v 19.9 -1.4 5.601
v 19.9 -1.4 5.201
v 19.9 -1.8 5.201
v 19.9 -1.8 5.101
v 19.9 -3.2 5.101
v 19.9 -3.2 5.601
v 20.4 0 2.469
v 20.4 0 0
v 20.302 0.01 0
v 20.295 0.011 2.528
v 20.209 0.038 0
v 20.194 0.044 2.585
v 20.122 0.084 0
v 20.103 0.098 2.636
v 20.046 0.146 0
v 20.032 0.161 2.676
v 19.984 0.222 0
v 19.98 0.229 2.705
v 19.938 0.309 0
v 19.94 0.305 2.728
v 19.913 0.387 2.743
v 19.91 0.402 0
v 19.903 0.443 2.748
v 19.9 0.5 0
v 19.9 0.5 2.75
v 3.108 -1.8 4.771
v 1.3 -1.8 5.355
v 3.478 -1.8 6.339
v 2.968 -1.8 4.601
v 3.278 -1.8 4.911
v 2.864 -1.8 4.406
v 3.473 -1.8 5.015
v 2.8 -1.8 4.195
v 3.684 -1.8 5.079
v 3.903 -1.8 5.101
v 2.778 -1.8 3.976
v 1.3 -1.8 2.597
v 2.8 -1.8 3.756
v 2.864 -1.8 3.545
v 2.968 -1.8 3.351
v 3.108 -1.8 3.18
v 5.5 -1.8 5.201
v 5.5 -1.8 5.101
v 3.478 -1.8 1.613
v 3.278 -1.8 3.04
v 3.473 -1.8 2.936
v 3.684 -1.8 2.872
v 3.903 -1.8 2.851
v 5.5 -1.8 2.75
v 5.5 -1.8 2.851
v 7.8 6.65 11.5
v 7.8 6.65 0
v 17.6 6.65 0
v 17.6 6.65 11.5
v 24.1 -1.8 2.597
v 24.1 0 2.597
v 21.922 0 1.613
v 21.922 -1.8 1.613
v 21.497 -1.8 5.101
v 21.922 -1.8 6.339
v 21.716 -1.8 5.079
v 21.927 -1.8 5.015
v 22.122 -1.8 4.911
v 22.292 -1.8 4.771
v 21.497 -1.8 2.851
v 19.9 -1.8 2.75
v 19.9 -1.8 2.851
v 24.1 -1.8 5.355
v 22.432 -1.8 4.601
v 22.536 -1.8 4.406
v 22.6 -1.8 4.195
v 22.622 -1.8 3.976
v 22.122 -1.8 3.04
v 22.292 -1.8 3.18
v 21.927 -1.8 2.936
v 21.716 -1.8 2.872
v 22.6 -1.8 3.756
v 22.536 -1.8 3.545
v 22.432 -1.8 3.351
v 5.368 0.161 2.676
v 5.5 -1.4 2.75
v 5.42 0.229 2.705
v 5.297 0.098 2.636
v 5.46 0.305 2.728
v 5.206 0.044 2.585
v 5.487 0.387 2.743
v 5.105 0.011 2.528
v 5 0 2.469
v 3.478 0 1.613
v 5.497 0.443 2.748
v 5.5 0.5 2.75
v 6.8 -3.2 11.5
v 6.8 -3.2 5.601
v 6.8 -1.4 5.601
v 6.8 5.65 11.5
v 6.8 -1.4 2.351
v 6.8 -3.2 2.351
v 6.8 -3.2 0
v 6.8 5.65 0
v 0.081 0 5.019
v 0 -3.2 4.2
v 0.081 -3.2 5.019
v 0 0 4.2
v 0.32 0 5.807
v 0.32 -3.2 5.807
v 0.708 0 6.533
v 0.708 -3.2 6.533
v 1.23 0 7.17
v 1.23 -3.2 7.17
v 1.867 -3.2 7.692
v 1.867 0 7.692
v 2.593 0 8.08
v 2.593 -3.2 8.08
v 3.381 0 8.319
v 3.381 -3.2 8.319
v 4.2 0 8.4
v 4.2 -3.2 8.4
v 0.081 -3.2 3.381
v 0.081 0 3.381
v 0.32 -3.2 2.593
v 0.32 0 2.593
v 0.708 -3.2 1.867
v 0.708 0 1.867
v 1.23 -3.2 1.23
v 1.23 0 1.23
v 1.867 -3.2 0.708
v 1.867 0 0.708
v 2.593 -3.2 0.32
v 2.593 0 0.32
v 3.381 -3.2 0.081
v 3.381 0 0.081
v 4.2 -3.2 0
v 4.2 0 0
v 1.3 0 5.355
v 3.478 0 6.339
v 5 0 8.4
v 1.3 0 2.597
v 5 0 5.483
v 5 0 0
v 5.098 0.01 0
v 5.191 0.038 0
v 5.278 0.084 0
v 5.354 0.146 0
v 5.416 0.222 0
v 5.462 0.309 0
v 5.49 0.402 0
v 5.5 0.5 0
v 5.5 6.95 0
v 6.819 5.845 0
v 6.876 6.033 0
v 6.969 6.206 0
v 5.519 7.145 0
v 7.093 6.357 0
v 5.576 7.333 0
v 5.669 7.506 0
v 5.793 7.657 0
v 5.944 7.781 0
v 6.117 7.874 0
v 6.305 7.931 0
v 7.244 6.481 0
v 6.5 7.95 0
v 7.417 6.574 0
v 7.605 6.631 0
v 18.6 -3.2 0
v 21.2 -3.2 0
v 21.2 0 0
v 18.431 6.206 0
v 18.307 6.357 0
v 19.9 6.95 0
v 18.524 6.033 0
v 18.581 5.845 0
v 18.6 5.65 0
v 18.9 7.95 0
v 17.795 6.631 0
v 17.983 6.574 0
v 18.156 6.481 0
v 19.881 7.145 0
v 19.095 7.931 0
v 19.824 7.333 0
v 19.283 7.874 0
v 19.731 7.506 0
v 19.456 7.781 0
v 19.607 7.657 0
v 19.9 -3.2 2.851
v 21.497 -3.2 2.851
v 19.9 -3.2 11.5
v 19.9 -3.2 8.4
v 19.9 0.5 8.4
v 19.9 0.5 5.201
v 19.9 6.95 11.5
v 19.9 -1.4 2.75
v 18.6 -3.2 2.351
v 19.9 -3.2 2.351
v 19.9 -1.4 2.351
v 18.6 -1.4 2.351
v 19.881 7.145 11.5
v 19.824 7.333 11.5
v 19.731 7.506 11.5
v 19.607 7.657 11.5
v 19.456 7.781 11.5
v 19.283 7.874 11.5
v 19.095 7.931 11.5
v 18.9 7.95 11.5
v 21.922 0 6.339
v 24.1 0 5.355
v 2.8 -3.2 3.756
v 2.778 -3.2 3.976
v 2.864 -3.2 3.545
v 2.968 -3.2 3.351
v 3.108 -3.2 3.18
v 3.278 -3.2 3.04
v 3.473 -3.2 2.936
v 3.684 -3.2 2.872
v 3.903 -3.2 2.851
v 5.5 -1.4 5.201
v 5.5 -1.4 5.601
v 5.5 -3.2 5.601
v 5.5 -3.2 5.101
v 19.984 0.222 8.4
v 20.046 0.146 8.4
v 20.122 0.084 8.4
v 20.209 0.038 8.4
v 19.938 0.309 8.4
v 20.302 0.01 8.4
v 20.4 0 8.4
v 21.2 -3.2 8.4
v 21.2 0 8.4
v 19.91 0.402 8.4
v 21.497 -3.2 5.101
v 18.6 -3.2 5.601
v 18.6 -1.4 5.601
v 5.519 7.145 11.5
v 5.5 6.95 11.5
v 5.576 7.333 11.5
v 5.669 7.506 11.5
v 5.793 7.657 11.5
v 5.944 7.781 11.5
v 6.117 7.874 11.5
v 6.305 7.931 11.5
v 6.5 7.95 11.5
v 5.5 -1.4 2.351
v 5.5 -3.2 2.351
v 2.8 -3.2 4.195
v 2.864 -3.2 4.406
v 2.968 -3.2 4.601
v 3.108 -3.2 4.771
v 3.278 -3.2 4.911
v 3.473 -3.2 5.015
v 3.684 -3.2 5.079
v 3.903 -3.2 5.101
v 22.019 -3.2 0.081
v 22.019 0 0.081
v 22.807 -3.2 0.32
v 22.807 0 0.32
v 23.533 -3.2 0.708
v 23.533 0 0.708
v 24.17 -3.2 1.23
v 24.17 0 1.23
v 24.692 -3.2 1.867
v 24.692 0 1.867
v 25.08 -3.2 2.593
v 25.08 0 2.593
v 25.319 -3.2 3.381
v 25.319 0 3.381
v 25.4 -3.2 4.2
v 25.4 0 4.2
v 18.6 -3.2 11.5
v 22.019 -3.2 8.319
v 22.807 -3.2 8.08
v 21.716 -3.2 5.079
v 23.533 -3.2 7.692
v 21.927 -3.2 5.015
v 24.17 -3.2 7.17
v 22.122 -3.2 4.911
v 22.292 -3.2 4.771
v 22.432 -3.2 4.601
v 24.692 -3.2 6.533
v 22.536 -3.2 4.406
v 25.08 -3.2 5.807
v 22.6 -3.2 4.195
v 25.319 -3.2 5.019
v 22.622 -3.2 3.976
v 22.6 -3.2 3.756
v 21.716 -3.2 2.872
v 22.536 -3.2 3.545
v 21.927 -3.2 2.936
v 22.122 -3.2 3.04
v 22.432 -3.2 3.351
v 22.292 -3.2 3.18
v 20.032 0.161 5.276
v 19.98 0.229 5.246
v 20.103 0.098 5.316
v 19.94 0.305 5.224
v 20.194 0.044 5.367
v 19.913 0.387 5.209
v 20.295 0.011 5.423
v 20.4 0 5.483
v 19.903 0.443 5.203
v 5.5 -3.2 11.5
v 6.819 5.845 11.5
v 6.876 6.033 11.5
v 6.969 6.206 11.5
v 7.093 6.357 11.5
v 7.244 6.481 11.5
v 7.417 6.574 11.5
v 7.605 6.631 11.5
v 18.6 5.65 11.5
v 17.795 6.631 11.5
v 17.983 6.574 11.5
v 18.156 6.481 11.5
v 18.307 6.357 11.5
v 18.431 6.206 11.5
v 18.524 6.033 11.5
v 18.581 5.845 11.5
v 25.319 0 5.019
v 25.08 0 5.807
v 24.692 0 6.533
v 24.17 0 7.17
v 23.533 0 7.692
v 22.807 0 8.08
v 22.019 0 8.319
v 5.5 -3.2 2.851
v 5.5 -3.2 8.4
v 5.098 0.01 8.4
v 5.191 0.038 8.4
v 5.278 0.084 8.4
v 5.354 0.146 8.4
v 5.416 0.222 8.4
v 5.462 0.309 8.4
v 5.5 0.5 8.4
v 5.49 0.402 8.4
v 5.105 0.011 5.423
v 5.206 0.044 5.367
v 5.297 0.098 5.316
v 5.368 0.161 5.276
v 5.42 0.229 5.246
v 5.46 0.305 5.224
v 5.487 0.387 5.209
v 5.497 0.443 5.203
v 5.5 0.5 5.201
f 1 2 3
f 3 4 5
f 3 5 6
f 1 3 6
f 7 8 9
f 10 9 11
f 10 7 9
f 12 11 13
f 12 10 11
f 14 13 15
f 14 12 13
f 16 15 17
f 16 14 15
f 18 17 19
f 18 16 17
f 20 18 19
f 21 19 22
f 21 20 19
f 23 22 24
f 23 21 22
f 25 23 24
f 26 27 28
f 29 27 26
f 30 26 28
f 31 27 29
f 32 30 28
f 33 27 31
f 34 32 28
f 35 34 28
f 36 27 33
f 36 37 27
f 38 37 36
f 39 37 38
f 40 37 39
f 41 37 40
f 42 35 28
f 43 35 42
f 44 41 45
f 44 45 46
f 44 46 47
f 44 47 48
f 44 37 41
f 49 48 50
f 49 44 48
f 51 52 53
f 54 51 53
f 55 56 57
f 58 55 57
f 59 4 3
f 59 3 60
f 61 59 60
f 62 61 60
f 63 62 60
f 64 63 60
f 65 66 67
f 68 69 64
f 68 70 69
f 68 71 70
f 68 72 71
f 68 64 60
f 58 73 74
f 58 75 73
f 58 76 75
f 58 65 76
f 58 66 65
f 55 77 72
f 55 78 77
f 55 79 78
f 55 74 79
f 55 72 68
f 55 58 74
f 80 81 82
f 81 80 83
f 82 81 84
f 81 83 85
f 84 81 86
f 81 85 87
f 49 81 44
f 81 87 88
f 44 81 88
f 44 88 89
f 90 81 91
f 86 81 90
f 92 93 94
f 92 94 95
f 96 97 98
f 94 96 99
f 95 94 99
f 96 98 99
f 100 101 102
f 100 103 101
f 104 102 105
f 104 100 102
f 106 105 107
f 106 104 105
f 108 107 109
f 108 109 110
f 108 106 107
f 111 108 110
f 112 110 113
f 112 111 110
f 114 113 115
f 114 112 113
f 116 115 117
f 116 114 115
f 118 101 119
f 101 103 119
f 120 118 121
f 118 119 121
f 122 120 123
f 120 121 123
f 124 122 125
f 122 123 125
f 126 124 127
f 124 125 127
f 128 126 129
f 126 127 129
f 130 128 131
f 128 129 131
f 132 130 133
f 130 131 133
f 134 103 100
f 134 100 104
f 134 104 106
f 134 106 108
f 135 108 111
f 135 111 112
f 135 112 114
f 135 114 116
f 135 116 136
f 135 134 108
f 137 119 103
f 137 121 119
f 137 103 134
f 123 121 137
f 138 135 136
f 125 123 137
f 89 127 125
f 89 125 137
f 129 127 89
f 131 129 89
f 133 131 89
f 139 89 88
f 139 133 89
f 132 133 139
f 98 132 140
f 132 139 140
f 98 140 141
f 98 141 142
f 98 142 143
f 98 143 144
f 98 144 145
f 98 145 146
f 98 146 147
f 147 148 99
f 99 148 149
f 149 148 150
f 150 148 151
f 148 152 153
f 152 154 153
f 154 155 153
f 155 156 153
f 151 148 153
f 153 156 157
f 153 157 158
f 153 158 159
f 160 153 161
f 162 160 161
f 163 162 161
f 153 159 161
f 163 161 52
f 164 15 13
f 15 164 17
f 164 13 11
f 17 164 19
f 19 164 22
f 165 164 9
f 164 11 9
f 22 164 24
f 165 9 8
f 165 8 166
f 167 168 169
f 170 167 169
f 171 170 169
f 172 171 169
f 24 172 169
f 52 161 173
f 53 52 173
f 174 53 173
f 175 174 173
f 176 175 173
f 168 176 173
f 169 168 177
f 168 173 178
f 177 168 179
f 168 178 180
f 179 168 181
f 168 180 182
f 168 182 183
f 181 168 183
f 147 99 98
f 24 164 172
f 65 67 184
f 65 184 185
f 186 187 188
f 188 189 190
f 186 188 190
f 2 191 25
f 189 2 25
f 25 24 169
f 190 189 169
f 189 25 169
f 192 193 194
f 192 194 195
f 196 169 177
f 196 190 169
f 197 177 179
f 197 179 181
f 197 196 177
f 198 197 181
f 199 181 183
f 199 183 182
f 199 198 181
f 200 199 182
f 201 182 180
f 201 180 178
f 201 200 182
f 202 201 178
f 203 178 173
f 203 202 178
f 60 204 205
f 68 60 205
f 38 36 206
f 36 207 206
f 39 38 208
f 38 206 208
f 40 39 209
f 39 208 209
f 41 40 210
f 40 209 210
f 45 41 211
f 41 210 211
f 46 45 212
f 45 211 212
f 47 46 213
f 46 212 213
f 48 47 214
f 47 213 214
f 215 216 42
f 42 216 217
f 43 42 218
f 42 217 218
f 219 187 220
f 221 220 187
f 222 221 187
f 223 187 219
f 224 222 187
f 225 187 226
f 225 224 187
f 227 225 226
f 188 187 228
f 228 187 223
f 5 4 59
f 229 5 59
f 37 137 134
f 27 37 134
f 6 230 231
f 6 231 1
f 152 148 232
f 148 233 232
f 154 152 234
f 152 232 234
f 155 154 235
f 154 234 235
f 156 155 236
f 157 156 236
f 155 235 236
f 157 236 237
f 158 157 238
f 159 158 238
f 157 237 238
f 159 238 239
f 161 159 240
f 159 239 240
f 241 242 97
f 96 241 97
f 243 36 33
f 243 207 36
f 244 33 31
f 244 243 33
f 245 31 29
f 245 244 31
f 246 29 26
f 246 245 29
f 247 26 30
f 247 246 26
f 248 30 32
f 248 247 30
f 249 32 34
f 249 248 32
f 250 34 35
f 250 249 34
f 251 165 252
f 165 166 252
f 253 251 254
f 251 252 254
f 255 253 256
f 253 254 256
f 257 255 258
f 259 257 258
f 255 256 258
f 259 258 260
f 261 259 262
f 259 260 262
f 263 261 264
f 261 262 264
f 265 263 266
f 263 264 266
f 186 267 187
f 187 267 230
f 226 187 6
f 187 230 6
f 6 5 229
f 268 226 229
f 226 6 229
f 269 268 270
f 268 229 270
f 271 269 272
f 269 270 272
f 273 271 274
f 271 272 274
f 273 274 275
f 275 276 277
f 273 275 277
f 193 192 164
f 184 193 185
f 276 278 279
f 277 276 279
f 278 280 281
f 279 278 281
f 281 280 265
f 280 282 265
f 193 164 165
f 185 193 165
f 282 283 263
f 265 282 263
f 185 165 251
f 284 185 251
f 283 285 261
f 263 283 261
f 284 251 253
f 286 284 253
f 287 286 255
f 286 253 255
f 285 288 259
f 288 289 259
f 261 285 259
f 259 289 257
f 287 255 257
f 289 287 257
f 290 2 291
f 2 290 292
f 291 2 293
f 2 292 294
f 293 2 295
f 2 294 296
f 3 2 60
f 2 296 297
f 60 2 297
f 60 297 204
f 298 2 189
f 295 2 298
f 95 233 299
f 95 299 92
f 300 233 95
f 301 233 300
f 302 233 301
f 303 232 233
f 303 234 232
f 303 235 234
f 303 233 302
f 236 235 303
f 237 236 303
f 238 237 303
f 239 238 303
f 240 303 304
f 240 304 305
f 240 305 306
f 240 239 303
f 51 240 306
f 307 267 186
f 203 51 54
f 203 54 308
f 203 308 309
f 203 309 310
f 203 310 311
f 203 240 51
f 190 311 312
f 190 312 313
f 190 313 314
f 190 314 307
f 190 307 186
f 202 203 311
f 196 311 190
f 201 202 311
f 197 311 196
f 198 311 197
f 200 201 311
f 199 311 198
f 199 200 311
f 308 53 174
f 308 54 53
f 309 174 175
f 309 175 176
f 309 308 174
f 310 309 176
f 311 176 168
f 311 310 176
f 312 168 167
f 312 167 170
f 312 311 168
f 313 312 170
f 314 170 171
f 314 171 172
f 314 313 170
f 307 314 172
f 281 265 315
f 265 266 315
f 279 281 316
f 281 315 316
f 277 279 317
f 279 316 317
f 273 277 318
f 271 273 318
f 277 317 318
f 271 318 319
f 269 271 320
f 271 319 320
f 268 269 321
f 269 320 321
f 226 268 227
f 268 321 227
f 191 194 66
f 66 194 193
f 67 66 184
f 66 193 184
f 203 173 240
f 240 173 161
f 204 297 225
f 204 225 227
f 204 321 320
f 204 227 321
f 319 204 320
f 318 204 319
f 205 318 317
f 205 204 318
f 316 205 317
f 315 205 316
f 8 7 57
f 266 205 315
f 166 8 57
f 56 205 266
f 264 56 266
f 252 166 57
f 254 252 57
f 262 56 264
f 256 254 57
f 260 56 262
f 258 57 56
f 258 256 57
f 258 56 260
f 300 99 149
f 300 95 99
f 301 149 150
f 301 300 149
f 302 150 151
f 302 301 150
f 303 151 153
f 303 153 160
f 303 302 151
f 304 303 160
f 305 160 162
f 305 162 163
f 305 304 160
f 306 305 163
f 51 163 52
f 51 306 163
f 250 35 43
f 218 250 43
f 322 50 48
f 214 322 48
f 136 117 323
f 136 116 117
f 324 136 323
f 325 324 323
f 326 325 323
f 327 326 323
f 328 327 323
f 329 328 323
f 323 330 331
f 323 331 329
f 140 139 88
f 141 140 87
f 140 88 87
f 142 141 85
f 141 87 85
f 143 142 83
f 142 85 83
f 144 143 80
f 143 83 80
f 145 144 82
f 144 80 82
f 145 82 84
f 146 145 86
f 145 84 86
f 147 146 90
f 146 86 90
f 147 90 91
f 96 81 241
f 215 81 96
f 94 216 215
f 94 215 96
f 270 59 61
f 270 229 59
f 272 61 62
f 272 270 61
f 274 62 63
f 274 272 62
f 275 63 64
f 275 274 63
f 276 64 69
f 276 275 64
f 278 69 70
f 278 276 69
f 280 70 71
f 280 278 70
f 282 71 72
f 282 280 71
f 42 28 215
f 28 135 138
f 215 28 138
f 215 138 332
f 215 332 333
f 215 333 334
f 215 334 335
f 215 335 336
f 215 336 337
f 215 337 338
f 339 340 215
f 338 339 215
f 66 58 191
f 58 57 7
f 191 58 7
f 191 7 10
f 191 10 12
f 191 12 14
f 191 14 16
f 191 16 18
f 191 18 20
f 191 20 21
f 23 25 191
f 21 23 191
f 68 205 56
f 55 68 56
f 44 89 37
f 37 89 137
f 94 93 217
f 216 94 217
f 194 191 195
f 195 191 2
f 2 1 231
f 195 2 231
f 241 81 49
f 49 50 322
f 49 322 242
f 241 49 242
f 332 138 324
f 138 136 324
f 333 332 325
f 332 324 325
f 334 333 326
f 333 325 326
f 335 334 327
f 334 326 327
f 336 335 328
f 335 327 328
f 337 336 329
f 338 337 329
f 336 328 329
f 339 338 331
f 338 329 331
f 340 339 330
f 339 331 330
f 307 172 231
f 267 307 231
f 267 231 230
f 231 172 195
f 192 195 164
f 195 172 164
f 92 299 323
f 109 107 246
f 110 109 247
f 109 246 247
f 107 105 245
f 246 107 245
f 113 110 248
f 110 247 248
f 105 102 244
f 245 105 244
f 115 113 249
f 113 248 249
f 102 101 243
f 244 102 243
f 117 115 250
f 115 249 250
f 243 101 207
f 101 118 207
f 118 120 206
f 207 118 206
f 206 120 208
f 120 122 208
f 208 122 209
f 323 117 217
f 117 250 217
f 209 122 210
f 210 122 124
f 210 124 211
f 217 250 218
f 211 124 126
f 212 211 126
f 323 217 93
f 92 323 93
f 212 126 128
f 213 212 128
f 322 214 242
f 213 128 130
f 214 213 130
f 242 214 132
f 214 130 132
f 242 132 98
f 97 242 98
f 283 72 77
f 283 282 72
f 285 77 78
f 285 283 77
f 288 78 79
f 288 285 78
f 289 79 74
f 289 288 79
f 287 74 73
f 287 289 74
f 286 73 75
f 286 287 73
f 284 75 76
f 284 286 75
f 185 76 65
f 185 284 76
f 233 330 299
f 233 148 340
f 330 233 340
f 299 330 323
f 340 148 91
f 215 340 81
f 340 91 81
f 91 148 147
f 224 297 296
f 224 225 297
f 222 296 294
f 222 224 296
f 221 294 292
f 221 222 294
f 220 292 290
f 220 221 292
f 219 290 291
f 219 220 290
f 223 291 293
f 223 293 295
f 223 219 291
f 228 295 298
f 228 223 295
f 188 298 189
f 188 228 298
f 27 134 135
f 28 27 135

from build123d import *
from OCP.BRepFilletAPI import BRepFilletAPI_MakeFillet

# Parameters (mm, degrees)
BOSS_EXTRUDE1_DEPTH = 11.5
SKETCH1_3_W         = 5.5
SKETCH1_3_H         = 3.2
BOSS_EXTRUDE2_DEPTH = 8.4
CUT_EXTRUDE1_DEPTH  = 1.8
SKETCH5_3_W         = 2.721866022
SKETCH5_3_H         = 2.25
CUT_EXTRUDE2_DEPTH  = 29.993318196
FILLET1_R           = 4.2
FILLET1_R_2         = 1.125
FILLET1_R_3         = 1
FILLET1_R_4         = 0.5
CUT_EXTRUDE12_DEPTH = 1.8


with BuildPart() as part:
    # Sketch1 → Boss-Extrude1 (new body)
    with BuildSketch(Plane.XY):
        Polygon((5.5, 7.95), (5.5, 0), (5.5, -3.2), (6.8, -3.2), (6.8, 6.65), (12.7, 6.65), (12.7, 7.95), align=None)
        Polygon((19.9, 7.95), (12.7, 7.95), (12.7, 6.65), (18.6, 6.65), (18.6, -3.2), (19.9, -3.2), (19.9, 0), align=None)
    extrude(amount=BOSS_EXTRUDE1_DEPTH)

    # Sketch1<3> → Boss-Extrude2 (add)
    with BuildSketch(Plane.XY):
        with Locations((2.75, -1.6)):
            Rectangle(SKETCH1_3_W, SKETCH1_3_H)
        with Locations((22.65, -1.6)):
            Rectangle(SKETCH1_3_W, SKETCH1_3_H)
    extrude(amount=BOSS_EXTRUDE2_DEPTH)

    # Sketch5 → Cut-Extrude1 (cut)
    with BuildSketch(Plane(origin=(0, 0, 0), x_dir=(1, 0, 0), z_dir=(0, 1, 0))):
        Polygon((3.478202851, -1.61261316), (1.3, -2.596789569), (1.3, -5.354715804), (3.478202851, -6.338892213), (5.5, -5.201401594), (5.5, -5.100752687), (2.778133978, -5.100752687), (2.778133978, -2.850752687), (5.5, -2.850752687), (5.5, -2.750103779), align=None)
        Polygon((19.9, -5.100752687), (19.9, -5.201401594), (21.921797149, -6.338892213), (24.1, -5.354715804), (24.1, -2.596789569), (21.921797149, -1.61261316), (19.9, -2.750103779), (19.9, -2.850752687), (22.621866022, -2.850752687), (22.621866022, -5.100752687), align=None)
    extrude(amount=-CUT_EXTRUDE1_DEPTH, mode=Mode.SUBTRACT)

    # Sketch5<3> → Cut-Extrude2 (cut, through all)
    with BuildSketch(Plane(origin=(0, 0, 0), x_dir=(1, 0, 0), z_dir=(0, 1, 0))):
        Polygon((2.778133978, -2.850752687), (2.778133978, -3.975752687), (2.778133978, -5.100752687), (5.5, -5.100752687), (5.5, -2.850752687), align=None)
        with Locations((21.260933011, -3.975752687)):
            Rectangle(SKETCH5_3_W, SKETCH5_3_H)
    extrude(amount=-CUT_EXTRUDE2_DEPTH, mode=Mode.SUBTRACT)

    # Fillet1
    fillet1_edges_1 = [part.edges().sort_by_distance(p)[0] for p in [
        (0, -1.6, 0),
        (0, -1.6, 8.4),
        (25.4, -1.6, 8.4),
        (25.4, -1.6, 0),
    ]]
    fillet1_edges_2 = [part.edges().sort_by_distance(p)[0] for p in [
        (2.778133978, -2.5, 5.100752687),
        (2.778133978, -2.5, 2.850752687),
        (22.621866022, -2.5, 2.850752687),
        (22.621866022, -2.5, 5.100752687),
    ]]
    fillet1_edges_3 = [part.edges().sort_by_distance(p)[0] for p in [
        (5.5, 7.95, 5.75),
        (19.9, 7.95, 5.75),
        (18.6, 6.65, 5.75),
        (6.8, 6.65, 5.75),
    ]]
    fillet1_edges_4 = [part.edges().sort_by_distance(p)[0] for p in [
        (5.5, 0, 6.800700797),
        (19.9, 0, 6.800700797),
        (19.9, 0, 1.37505189),
        (5.5, 0, 1.37505189),
    ]]
    fillet1 = BRepFilletAPI_MakeFillet(part.part.solid().wrapped)
    for e in fillet1_edges_1:
        fillet1.Add(FILLET1_R - 0.0001, e.wrapped)
    for e in fillet1_edges_2:
        fillet1.Add(FILLET1_R_2 - 0.0001, e.wrapped)
    for e in fillet1_edges_3:
        fillet1.Add(FILLET1_R_3 - 0.0001, e.wrapped)
    for e in fillet1_edges_4:
        fillet1.Add(FILLET1_R_4 - 0.0001, e.wrapped)
    add(Compound.cast(fillet1.Shape()), mode=Mode.REPLACE)  # a hair under: the kernel refuses the full size

    # Sketch6 → Cut-Extrude12 (cut)
    with BuildSketch(Plane.XZ.offset(3.2)):
        Polygon((19.9, 5.100752687), (19.9, 2.850752687), (19.9, 2.350752687), (18.327658743, 2.350752687), (18.327658743, 5.600752687), (19.9, 5.600752687), align=None)
        Polygon((5.5, 5.600752687), (5.5, 5.100752687), (5.5, 2.850752687), (5.5, 2.350752687), (6.8, 2.350752687), (6.8, 5.600752687), align=None)
    extrude(amount=-CUT_EXTRUDE12_DEPTH, mode=Mode.SUBTRACT)


solid = part.part
